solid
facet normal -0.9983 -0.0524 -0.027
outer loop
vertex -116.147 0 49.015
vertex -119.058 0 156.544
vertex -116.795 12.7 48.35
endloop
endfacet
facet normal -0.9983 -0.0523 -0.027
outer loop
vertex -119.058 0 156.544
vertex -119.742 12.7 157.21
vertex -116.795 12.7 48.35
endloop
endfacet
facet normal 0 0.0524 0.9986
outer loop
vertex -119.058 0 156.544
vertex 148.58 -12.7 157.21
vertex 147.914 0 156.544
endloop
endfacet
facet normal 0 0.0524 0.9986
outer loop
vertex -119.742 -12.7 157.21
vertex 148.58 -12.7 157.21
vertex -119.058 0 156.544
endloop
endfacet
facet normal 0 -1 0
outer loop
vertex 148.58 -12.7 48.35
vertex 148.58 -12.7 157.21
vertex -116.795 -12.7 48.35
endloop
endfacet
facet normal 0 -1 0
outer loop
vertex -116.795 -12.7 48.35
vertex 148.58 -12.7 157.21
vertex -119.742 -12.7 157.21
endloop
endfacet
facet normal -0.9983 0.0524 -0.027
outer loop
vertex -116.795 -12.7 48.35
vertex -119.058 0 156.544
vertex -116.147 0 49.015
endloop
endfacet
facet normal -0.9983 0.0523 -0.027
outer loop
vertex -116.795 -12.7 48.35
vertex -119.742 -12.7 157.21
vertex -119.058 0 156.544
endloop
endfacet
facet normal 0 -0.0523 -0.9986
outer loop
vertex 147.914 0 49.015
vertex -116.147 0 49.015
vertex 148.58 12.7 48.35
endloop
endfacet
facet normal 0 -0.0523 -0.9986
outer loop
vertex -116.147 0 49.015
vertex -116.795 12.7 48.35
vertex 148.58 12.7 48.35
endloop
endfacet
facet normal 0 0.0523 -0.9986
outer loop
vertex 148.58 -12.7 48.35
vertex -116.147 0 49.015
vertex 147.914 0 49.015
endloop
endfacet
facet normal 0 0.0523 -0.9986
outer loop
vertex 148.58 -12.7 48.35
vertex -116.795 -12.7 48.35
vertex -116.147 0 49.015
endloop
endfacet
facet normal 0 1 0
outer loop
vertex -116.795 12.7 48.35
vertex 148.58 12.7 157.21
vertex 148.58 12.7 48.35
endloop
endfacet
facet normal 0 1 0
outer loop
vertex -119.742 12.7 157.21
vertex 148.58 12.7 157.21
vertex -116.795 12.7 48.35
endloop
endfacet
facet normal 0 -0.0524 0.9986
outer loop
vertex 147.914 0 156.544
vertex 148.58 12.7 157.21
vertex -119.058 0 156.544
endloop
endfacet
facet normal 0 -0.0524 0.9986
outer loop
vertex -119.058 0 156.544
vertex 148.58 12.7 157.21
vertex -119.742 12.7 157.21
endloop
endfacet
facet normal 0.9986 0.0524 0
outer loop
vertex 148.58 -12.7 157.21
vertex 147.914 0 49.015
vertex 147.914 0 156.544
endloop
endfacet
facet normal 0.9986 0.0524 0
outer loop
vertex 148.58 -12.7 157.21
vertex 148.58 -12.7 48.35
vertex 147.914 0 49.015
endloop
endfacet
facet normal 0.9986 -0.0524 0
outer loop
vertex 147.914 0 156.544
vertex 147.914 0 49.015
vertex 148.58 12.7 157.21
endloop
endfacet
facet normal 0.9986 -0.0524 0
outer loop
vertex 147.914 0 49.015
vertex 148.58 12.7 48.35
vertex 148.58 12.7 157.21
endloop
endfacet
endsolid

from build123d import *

# Parameters (mm, degrees)
F1_DEPTH = 12.7
F1_TAPER = -3


with BuildPart() as f1:
    # F0 (on Front) → F1 (new body, symmetric)
    with BuildSketch(Plane.XZ):
        Polygon((147.9144990444, 156.5441638231), (-119.0584152937, 156.5441638231), (-116.1468625069, 49.0151830018), (147.9144990444, 49.0151830018), align=None)
    extrude(amount=F1_DEPTH, both=True, taper=F1_TAPER)


solid = f1.part
